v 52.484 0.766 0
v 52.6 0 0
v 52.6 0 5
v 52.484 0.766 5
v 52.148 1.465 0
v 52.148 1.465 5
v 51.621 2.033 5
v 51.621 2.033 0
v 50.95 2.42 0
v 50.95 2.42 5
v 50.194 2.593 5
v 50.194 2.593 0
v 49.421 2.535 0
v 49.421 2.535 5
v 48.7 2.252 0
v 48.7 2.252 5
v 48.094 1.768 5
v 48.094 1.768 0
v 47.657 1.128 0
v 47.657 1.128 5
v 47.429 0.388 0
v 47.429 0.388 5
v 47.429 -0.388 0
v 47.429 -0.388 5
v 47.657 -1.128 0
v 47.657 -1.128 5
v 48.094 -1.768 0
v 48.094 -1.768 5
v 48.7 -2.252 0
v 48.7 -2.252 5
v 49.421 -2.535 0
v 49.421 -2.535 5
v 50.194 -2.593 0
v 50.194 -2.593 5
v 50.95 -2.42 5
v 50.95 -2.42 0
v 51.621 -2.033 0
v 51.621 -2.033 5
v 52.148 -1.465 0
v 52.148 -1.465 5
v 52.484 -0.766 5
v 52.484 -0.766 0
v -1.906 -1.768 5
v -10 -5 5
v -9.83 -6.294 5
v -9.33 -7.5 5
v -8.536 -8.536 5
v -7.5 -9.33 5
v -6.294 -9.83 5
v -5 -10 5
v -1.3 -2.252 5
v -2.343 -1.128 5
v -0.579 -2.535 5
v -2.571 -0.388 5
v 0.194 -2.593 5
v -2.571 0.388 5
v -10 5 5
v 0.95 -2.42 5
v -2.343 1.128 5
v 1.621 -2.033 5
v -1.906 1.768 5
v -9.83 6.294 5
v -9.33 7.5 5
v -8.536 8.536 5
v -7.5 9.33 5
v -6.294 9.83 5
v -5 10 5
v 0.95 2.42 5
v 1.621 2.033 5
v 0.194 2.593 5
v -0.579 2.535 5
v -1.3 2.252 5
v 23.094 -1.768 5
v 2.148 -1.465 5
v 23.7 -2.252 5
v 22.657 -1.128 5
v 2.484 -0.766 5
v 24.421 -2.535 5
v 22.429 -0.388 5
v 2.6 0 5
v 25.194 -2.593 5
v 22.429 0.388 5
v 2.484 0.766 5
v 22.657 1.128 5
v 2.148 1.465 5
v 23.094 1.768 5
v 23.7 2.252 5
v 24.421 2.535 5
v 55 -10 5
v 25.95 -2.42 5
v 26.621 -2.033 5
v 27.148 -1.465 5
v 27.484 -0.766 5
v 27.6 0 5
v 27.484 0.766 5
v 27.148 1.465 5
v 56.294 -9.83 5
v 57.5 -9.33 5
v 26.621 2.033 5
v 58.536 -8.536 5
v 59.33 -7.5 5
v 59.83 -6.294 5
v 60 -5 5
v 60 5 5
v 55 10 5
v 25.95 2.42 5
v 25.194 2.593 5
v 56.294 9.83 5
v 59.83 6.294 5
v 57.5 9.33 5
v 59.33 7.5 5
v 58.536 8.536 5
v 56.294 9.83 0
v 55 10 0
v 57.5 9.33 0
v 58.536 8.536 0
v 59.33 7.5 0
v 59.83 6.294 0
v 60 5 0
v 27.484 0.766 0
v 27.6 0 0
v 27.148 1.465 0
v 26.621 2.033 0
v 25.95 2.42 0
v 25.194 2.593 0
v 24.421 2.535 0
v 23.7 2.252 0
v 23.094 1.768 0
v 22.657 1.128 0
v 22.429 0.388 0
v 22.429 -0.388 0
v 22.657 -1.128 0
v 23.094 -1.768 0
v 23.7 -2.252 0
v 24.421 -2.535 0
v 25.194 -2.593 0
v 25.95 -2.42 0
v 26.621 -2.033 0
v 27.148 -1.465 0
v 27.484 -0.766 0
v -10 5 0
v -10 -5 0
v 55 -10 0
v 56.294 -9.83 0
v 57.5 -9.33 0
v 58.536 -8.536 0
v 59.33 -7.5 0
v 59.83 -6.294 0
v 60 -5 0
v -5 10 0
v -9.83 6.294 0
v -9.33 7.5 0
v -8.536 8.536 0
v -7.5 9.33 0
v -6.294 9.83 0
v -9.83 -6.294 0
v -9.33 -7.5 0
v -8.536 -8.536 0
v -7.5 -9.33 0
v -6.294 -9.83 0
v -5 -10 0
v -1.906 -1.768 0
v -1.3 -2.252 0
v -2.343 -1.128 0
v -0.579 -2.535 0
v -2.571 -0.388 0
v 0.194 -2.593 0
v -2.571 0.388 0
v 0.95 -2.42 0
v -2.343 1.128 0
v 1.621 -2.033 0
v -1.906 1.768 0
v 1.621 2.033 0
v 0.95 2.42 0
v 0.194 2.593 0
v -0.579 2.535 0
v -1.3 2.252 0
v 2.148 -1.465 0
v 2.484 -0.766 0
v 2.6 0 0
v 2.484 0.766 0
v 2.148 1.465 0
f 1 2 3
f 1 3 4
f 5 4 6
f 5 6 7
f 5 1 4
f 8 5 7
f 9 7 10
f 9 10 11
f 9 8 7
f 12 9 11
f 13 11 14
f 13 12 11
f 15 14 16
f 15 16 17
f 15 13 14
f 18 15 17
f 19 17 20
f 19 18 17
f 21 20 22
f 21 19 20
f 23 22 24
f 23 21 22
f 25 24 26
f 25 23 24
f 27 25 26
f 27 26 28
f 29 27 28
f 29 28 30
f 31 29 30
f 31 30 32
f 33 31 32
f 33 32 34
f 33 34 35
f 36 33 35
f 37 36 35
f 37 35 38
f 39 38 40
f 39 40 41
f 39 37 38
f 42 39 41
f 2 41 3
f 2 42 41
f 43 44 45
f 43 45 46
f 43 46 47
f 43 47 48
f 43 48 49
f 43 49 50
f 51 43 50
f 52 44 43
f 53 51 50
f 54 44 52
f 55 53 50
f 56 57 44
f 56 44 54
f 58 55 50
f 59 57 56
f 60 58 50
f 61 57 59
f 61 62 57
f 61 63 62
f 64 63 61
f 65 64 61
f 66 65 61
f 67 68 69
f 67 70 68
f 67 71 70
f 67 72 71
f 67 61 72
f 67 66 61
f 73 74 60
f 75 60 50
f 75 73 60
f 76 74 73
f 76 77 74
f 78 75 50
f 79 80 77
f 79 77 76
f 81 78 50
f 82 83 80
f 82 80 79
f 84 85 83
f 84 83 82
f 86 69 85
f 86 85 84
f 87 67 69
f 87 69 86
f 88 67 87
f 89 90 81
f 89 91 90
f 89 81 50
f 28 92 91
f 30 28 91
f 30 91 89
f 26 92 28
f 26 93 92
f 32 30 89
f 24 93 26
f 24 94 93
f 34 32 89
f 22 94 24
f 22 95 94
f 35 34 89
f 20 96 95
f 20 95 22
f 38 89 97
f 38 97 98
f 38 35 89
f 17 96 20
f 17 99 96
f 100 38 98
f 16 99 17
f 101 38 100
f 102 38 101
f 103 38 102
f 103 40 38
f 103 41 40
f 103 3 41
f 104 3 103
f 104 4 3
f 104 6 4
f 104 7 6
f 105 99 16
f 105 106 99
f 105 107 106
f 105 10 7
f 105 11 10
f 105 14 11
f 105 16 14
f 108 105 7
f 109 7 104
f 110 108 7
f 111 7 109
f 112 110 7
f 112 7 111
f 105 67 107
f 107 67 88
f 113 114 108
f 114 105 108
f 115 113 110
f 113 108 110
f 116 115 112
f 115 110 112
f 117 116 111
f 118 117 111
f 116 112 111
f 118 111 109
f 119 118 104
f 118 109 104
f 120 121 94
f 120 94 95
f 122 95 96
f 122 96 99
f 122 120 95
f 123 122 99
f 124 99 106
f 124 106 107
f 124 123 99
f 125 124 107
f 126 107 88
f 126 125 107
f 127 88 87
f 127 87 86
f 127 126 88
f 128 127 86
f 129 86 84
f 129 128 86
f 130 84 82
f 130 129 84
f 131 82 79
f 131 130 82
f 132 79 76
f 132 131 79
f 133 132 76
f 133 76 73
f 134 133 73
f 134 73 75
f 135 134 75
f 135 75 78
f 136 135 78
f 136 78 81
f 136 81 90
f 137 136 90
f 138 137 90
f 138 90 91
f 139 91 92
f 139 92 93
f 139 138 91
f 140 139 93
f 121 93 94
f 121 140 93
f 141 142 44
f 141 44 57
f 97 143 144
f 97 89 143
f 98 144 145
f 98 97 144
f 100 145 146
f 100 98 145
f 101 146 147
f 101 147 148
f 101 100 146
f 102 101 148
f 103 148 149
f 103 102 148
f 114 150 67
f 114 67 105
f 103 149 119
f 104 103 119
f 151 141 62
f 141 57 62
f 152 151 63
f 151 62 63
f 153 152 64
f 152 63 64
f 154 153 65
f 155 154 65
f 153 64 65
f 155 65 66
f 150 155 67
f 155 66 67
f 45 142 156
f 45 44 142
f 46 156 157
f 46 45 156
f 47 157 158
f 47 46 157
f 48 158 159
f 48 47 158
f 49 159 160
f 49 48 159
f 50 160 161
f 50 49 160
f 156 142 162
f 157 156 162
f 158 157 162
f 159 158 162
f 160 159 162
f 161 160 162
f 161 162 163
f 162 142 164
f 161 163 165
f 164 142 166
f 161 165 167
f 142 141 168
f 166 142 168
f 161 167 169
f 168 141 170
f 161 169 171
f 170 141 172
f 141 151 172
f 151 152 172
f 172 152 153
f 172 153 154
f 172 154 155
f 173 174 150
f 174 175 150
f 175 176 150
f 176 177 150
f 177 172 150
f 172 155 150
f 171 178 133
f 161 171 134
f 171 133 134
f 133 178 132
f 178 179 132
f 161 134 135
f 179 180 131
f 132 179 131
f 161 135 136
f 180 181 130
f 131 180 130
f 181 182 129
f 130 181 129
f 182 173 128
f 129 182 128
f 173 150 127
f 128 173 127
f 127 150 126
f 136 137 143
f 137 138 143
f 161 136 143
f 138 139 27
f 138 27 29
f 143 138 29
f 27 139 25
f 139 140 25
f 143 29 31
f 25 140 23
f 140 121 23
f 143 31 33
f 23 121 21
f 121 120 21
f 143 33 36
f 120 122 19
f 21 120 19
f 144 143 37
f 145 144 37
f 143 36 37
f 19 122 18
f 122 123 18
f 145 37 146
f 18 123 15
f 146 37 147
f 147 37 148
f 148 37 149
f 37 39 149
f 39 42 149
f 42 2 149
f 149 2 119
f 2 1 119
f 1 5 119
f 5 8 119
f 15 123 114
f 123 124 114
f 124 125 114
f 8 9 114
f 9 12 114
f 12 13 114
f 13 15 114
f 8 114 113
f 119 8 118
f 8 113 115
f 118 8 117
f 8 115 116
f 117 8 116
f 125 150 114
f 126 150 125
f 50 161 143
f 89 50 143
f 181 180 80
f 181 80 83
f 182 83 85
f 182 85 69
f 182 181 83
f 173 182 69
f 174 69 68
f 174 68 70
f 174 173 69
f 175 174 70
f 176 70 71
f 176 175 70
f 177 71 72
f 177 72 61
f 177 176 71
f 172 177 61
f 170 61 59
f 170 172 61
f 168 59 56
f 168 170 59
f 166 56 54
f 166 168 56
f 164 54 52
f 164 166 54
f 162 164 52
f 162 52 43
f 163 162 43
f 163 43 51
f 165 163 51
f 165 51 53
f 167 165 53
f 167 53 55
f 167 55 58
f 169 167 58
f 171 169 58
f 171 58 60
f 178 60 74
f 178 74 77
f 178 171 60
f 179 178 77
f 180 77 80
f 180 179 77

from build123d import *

# Parameters (mm, degrees)
SKETCH_2_W      = 70
SKETCH_2_H      = 20
SKETCH_2_R      = 2.6
EXTRUDE_1_DEPTH = 5
FILLET_1_R      = 5


with BuildPart() as part:
    # ｽｹｯﾁ2 → ﾎﾞｽ - 押し出し1 (new body)
    with BuildSketch(Plane.XY):
        with Locations((25, 0)):
            Rectangle(SKETCH_2_W, SKETCH_2_H)
        with Locations((25, 0)):
            Circle(SKETCH_2_R, mode=Mode.SUBTRACT)
        with Locations((50, 0)):
            Circle(SKETCH_2_R, mode=Mode.SUBTRACT)
        Circle(SKETCH_2_R, mode=Mode.SUBTRACT)
    extrude(amount=EXTRUDE_1_DEPTH)

    # ﾌｨﾚｯﾄ1
    fillet_1_edges = [part.edges().sort_by_distance(p)[0] for p in [
        (-10, 10, 2.5),
        (60, 10, 2.5),
        (60, -10, 2.5),
        (-10, -10, 2.5),
    ]]
    fillet(fillet_1_edges, radius=FILLET_1_R)


solid = part.part
